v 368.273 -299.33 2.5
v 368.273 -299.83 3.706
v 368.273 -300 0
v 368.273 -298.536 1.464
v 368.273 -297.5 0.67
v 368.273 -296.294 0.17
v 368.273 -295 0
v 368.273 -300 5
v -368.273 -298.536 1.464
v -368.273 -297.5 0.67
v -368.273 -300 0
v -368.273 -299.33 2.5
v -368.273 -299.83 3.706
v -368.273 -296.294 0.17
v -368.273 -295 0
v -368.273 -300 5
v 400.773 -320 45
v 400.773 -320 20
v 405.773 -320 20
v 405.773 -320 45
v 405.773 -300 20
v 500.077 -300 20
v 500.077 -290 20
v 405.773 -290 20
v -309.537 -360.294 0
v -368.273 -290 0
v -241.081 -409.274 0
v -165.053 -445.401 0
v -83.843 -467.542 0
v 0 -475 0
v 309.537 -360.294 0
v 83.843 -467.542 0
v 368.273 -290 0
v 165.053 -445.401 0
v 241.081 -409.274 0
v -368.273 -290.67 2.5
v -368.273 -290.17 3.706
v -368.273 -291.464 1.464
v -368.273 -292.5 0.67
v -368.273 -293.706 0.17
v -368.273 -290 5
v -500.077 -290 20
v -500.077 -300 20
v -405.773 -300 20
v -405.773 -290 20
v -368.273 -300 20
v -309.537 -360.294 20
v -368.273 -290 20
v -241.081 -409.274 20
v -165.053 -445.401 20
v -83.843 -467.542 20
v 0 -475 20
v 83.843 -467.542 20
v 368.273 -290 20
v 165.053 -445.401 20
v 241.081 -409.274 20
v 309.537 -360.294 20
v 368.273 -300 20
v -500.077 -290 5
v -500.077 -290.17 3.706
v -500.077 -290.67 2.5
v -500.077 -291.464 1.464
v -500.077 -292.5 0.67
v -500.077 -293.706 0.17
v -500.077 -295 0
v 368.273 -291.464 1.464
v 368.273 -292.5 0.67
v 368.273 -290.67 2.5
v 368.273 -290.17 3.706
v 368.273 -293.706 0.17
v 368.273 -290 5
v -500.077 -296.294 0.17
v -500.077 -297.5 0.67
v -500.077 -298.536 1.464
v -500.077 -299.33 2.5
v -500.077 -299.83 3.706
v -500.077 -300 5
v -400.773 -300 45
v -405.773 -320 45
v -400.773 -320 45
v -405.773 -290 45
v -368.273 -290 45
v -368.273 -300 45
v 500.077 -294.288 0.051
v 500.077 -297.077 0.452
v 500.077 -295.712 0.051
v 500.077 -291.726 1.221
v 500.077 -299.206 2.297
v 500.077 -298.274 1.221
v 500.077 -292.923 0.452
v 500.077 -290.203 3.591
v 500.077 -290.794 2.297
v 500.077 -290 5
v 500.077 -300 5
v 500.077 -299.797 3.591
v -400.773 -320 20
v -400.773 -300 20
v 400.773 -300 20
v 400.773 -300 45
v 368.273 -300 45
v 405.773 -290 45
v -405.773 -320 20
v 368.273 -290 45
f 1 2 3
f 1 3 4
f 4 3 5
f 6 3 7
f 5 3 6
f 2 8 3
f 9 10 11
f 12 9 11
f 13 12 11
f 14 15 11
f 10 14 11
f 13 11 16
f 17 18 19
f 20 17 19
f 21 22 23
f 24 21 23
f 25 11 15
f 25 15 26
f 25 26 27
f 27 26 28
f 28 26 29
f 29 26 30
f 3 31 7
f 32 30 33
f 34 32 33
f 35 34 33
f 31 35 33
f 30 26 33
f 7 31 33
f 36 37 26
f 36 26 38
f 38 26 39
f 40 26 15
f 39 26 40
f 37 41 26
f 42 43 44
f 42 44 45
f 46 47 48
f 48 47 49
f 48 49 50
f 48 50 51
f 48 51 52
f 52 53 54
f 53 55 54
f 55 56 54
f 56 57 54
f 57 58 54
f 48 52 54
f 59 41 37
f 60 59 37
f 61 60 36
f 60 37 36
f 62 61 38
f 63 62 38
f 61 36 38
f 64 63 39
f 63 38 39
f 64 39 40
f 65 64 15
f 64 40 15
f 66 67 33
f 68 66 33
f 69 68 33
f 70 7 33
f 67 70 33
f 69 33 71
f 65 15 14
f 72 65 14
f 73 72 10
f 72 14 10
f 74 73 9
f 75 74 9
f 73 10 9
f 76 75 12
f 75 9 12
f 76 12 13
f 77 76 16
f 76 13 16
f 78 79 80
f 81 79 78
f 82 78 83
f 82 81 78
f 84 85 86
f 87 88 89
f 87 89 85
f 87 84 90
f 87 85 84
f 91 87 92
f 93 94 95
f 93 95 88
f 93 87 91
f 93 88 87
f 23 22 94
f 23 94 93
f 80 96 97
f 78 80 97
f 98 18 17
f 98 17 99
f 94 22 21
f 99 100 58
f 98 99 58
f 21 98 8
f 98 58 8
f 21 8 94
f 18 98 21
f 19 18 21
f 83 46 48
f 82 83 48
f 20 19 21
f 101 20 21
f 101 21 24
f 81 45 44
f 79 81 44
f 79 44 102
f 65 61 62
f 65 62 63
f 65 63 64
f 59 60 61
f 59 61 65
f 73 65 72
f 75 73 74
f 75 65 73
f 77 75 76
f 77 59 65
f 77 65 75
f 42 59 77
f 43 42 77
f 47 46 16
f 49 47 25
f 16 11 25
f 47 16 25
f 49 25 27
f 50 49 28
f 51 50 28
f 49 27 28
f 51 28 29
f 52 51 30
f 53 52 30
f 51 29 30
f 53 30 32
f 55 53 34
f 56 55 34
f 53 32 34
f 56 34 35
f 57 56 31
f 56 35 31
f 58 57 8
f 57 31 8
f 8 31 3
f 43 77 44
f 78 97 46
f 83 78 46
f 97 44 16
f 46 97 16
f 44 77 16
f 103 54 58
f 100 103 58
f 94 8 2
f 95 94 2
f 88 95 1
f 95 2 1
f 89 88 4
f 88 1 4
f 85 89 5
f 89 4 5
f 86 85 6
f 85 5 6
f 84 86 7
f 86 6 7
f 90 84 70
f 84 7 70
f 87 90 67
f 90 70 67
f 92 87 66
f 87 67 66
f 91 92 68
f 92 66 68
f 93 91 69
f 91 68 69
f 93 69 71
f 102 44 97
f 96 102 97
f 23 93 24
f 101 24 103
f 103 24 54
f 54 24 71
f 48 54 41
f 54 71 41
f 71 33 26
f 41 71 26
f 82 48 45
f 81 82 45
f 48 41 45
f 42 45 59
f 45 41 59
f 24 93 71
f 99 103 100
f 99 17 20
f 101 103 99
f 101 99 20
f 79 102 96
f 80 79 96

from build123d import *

# Parameters (mm, degrees)
F1_DEPTH = 20
F3_DEPTH = 131.803615
F5_DEPTH = 131.803615
F6_W     = 5
F6_H     = 20
F7_DEPTH = 25


with BuildPart() as f1:
    # F0 (on Top) → F1 (new body)
    with BuildSketch(Plane.XY):
        with BuildLine():
            Line((-368.272997, -290), (-368.272997, -300))
            ThreePointArc((-368.272997, -300), (0, -475), (368.272997, -300))
            Line((368.272997, -300), (368.272997, -290))
            Line((368.272997, -290), (-368.272997, -290))
        make_face()
    extrude(amount=F1_DEPTH)

    # F2 (on face) → F3 (join)
    with BuildSketch(Plane.YZ.offset(368.272997)):
        with BuildLine():
            Line((-300, 20), (-300, 5))
            ThreePointArc((-300, 5), (-295, 0), (-290, 5))
            Line((-290, 5), (-290, 20))
            Line((-290, 20), (-300, 20))
        make_face()
    extrude(amount=F3_DEPTH)

    # F4 (on face) → F5 (join)
    with BuildSketch(Plane(origin=(-368.272997, 0, 0), x_dir=(0, -1, 0), z_dir=(-1, 0, 0))):
        with BuildLine():
            Line((290, 20), (290, 5))
            ThreePointArc((290, 5), (291.464466, 1.464466), (295, 0))
            ThreePointArc((295, 0), (298.535534, 1.464466), (300, 5))
            Line((300, 5), (300, 20))
            Line((300, 20), (290, 20))
        make_face()
    extrude(amount=F5_DEPTH)

    # F6 (on face) → F7 (join)
    with BuildSketch(Plane.XY.offset(20)):
        Polygon((-368.272997, -290), (-405.772997, -290), (-405.772997, -300), (-400.772997, -300), (-368.272997, -300), align=None)
        with Locations((-403.272997, -310)):
            Rectangle(F6_W, F6_H)
        Polygon((405.772997, -290), (368.272997, -290), (368.272997, -300), (400.772997, -300), (405.772997, -300), align=None)
        with Locations((403.272997, -310)):
            Rectangle(F6_W, F6_H)
    extrude(amount=F7_DEPTH)


solid = f1.part
